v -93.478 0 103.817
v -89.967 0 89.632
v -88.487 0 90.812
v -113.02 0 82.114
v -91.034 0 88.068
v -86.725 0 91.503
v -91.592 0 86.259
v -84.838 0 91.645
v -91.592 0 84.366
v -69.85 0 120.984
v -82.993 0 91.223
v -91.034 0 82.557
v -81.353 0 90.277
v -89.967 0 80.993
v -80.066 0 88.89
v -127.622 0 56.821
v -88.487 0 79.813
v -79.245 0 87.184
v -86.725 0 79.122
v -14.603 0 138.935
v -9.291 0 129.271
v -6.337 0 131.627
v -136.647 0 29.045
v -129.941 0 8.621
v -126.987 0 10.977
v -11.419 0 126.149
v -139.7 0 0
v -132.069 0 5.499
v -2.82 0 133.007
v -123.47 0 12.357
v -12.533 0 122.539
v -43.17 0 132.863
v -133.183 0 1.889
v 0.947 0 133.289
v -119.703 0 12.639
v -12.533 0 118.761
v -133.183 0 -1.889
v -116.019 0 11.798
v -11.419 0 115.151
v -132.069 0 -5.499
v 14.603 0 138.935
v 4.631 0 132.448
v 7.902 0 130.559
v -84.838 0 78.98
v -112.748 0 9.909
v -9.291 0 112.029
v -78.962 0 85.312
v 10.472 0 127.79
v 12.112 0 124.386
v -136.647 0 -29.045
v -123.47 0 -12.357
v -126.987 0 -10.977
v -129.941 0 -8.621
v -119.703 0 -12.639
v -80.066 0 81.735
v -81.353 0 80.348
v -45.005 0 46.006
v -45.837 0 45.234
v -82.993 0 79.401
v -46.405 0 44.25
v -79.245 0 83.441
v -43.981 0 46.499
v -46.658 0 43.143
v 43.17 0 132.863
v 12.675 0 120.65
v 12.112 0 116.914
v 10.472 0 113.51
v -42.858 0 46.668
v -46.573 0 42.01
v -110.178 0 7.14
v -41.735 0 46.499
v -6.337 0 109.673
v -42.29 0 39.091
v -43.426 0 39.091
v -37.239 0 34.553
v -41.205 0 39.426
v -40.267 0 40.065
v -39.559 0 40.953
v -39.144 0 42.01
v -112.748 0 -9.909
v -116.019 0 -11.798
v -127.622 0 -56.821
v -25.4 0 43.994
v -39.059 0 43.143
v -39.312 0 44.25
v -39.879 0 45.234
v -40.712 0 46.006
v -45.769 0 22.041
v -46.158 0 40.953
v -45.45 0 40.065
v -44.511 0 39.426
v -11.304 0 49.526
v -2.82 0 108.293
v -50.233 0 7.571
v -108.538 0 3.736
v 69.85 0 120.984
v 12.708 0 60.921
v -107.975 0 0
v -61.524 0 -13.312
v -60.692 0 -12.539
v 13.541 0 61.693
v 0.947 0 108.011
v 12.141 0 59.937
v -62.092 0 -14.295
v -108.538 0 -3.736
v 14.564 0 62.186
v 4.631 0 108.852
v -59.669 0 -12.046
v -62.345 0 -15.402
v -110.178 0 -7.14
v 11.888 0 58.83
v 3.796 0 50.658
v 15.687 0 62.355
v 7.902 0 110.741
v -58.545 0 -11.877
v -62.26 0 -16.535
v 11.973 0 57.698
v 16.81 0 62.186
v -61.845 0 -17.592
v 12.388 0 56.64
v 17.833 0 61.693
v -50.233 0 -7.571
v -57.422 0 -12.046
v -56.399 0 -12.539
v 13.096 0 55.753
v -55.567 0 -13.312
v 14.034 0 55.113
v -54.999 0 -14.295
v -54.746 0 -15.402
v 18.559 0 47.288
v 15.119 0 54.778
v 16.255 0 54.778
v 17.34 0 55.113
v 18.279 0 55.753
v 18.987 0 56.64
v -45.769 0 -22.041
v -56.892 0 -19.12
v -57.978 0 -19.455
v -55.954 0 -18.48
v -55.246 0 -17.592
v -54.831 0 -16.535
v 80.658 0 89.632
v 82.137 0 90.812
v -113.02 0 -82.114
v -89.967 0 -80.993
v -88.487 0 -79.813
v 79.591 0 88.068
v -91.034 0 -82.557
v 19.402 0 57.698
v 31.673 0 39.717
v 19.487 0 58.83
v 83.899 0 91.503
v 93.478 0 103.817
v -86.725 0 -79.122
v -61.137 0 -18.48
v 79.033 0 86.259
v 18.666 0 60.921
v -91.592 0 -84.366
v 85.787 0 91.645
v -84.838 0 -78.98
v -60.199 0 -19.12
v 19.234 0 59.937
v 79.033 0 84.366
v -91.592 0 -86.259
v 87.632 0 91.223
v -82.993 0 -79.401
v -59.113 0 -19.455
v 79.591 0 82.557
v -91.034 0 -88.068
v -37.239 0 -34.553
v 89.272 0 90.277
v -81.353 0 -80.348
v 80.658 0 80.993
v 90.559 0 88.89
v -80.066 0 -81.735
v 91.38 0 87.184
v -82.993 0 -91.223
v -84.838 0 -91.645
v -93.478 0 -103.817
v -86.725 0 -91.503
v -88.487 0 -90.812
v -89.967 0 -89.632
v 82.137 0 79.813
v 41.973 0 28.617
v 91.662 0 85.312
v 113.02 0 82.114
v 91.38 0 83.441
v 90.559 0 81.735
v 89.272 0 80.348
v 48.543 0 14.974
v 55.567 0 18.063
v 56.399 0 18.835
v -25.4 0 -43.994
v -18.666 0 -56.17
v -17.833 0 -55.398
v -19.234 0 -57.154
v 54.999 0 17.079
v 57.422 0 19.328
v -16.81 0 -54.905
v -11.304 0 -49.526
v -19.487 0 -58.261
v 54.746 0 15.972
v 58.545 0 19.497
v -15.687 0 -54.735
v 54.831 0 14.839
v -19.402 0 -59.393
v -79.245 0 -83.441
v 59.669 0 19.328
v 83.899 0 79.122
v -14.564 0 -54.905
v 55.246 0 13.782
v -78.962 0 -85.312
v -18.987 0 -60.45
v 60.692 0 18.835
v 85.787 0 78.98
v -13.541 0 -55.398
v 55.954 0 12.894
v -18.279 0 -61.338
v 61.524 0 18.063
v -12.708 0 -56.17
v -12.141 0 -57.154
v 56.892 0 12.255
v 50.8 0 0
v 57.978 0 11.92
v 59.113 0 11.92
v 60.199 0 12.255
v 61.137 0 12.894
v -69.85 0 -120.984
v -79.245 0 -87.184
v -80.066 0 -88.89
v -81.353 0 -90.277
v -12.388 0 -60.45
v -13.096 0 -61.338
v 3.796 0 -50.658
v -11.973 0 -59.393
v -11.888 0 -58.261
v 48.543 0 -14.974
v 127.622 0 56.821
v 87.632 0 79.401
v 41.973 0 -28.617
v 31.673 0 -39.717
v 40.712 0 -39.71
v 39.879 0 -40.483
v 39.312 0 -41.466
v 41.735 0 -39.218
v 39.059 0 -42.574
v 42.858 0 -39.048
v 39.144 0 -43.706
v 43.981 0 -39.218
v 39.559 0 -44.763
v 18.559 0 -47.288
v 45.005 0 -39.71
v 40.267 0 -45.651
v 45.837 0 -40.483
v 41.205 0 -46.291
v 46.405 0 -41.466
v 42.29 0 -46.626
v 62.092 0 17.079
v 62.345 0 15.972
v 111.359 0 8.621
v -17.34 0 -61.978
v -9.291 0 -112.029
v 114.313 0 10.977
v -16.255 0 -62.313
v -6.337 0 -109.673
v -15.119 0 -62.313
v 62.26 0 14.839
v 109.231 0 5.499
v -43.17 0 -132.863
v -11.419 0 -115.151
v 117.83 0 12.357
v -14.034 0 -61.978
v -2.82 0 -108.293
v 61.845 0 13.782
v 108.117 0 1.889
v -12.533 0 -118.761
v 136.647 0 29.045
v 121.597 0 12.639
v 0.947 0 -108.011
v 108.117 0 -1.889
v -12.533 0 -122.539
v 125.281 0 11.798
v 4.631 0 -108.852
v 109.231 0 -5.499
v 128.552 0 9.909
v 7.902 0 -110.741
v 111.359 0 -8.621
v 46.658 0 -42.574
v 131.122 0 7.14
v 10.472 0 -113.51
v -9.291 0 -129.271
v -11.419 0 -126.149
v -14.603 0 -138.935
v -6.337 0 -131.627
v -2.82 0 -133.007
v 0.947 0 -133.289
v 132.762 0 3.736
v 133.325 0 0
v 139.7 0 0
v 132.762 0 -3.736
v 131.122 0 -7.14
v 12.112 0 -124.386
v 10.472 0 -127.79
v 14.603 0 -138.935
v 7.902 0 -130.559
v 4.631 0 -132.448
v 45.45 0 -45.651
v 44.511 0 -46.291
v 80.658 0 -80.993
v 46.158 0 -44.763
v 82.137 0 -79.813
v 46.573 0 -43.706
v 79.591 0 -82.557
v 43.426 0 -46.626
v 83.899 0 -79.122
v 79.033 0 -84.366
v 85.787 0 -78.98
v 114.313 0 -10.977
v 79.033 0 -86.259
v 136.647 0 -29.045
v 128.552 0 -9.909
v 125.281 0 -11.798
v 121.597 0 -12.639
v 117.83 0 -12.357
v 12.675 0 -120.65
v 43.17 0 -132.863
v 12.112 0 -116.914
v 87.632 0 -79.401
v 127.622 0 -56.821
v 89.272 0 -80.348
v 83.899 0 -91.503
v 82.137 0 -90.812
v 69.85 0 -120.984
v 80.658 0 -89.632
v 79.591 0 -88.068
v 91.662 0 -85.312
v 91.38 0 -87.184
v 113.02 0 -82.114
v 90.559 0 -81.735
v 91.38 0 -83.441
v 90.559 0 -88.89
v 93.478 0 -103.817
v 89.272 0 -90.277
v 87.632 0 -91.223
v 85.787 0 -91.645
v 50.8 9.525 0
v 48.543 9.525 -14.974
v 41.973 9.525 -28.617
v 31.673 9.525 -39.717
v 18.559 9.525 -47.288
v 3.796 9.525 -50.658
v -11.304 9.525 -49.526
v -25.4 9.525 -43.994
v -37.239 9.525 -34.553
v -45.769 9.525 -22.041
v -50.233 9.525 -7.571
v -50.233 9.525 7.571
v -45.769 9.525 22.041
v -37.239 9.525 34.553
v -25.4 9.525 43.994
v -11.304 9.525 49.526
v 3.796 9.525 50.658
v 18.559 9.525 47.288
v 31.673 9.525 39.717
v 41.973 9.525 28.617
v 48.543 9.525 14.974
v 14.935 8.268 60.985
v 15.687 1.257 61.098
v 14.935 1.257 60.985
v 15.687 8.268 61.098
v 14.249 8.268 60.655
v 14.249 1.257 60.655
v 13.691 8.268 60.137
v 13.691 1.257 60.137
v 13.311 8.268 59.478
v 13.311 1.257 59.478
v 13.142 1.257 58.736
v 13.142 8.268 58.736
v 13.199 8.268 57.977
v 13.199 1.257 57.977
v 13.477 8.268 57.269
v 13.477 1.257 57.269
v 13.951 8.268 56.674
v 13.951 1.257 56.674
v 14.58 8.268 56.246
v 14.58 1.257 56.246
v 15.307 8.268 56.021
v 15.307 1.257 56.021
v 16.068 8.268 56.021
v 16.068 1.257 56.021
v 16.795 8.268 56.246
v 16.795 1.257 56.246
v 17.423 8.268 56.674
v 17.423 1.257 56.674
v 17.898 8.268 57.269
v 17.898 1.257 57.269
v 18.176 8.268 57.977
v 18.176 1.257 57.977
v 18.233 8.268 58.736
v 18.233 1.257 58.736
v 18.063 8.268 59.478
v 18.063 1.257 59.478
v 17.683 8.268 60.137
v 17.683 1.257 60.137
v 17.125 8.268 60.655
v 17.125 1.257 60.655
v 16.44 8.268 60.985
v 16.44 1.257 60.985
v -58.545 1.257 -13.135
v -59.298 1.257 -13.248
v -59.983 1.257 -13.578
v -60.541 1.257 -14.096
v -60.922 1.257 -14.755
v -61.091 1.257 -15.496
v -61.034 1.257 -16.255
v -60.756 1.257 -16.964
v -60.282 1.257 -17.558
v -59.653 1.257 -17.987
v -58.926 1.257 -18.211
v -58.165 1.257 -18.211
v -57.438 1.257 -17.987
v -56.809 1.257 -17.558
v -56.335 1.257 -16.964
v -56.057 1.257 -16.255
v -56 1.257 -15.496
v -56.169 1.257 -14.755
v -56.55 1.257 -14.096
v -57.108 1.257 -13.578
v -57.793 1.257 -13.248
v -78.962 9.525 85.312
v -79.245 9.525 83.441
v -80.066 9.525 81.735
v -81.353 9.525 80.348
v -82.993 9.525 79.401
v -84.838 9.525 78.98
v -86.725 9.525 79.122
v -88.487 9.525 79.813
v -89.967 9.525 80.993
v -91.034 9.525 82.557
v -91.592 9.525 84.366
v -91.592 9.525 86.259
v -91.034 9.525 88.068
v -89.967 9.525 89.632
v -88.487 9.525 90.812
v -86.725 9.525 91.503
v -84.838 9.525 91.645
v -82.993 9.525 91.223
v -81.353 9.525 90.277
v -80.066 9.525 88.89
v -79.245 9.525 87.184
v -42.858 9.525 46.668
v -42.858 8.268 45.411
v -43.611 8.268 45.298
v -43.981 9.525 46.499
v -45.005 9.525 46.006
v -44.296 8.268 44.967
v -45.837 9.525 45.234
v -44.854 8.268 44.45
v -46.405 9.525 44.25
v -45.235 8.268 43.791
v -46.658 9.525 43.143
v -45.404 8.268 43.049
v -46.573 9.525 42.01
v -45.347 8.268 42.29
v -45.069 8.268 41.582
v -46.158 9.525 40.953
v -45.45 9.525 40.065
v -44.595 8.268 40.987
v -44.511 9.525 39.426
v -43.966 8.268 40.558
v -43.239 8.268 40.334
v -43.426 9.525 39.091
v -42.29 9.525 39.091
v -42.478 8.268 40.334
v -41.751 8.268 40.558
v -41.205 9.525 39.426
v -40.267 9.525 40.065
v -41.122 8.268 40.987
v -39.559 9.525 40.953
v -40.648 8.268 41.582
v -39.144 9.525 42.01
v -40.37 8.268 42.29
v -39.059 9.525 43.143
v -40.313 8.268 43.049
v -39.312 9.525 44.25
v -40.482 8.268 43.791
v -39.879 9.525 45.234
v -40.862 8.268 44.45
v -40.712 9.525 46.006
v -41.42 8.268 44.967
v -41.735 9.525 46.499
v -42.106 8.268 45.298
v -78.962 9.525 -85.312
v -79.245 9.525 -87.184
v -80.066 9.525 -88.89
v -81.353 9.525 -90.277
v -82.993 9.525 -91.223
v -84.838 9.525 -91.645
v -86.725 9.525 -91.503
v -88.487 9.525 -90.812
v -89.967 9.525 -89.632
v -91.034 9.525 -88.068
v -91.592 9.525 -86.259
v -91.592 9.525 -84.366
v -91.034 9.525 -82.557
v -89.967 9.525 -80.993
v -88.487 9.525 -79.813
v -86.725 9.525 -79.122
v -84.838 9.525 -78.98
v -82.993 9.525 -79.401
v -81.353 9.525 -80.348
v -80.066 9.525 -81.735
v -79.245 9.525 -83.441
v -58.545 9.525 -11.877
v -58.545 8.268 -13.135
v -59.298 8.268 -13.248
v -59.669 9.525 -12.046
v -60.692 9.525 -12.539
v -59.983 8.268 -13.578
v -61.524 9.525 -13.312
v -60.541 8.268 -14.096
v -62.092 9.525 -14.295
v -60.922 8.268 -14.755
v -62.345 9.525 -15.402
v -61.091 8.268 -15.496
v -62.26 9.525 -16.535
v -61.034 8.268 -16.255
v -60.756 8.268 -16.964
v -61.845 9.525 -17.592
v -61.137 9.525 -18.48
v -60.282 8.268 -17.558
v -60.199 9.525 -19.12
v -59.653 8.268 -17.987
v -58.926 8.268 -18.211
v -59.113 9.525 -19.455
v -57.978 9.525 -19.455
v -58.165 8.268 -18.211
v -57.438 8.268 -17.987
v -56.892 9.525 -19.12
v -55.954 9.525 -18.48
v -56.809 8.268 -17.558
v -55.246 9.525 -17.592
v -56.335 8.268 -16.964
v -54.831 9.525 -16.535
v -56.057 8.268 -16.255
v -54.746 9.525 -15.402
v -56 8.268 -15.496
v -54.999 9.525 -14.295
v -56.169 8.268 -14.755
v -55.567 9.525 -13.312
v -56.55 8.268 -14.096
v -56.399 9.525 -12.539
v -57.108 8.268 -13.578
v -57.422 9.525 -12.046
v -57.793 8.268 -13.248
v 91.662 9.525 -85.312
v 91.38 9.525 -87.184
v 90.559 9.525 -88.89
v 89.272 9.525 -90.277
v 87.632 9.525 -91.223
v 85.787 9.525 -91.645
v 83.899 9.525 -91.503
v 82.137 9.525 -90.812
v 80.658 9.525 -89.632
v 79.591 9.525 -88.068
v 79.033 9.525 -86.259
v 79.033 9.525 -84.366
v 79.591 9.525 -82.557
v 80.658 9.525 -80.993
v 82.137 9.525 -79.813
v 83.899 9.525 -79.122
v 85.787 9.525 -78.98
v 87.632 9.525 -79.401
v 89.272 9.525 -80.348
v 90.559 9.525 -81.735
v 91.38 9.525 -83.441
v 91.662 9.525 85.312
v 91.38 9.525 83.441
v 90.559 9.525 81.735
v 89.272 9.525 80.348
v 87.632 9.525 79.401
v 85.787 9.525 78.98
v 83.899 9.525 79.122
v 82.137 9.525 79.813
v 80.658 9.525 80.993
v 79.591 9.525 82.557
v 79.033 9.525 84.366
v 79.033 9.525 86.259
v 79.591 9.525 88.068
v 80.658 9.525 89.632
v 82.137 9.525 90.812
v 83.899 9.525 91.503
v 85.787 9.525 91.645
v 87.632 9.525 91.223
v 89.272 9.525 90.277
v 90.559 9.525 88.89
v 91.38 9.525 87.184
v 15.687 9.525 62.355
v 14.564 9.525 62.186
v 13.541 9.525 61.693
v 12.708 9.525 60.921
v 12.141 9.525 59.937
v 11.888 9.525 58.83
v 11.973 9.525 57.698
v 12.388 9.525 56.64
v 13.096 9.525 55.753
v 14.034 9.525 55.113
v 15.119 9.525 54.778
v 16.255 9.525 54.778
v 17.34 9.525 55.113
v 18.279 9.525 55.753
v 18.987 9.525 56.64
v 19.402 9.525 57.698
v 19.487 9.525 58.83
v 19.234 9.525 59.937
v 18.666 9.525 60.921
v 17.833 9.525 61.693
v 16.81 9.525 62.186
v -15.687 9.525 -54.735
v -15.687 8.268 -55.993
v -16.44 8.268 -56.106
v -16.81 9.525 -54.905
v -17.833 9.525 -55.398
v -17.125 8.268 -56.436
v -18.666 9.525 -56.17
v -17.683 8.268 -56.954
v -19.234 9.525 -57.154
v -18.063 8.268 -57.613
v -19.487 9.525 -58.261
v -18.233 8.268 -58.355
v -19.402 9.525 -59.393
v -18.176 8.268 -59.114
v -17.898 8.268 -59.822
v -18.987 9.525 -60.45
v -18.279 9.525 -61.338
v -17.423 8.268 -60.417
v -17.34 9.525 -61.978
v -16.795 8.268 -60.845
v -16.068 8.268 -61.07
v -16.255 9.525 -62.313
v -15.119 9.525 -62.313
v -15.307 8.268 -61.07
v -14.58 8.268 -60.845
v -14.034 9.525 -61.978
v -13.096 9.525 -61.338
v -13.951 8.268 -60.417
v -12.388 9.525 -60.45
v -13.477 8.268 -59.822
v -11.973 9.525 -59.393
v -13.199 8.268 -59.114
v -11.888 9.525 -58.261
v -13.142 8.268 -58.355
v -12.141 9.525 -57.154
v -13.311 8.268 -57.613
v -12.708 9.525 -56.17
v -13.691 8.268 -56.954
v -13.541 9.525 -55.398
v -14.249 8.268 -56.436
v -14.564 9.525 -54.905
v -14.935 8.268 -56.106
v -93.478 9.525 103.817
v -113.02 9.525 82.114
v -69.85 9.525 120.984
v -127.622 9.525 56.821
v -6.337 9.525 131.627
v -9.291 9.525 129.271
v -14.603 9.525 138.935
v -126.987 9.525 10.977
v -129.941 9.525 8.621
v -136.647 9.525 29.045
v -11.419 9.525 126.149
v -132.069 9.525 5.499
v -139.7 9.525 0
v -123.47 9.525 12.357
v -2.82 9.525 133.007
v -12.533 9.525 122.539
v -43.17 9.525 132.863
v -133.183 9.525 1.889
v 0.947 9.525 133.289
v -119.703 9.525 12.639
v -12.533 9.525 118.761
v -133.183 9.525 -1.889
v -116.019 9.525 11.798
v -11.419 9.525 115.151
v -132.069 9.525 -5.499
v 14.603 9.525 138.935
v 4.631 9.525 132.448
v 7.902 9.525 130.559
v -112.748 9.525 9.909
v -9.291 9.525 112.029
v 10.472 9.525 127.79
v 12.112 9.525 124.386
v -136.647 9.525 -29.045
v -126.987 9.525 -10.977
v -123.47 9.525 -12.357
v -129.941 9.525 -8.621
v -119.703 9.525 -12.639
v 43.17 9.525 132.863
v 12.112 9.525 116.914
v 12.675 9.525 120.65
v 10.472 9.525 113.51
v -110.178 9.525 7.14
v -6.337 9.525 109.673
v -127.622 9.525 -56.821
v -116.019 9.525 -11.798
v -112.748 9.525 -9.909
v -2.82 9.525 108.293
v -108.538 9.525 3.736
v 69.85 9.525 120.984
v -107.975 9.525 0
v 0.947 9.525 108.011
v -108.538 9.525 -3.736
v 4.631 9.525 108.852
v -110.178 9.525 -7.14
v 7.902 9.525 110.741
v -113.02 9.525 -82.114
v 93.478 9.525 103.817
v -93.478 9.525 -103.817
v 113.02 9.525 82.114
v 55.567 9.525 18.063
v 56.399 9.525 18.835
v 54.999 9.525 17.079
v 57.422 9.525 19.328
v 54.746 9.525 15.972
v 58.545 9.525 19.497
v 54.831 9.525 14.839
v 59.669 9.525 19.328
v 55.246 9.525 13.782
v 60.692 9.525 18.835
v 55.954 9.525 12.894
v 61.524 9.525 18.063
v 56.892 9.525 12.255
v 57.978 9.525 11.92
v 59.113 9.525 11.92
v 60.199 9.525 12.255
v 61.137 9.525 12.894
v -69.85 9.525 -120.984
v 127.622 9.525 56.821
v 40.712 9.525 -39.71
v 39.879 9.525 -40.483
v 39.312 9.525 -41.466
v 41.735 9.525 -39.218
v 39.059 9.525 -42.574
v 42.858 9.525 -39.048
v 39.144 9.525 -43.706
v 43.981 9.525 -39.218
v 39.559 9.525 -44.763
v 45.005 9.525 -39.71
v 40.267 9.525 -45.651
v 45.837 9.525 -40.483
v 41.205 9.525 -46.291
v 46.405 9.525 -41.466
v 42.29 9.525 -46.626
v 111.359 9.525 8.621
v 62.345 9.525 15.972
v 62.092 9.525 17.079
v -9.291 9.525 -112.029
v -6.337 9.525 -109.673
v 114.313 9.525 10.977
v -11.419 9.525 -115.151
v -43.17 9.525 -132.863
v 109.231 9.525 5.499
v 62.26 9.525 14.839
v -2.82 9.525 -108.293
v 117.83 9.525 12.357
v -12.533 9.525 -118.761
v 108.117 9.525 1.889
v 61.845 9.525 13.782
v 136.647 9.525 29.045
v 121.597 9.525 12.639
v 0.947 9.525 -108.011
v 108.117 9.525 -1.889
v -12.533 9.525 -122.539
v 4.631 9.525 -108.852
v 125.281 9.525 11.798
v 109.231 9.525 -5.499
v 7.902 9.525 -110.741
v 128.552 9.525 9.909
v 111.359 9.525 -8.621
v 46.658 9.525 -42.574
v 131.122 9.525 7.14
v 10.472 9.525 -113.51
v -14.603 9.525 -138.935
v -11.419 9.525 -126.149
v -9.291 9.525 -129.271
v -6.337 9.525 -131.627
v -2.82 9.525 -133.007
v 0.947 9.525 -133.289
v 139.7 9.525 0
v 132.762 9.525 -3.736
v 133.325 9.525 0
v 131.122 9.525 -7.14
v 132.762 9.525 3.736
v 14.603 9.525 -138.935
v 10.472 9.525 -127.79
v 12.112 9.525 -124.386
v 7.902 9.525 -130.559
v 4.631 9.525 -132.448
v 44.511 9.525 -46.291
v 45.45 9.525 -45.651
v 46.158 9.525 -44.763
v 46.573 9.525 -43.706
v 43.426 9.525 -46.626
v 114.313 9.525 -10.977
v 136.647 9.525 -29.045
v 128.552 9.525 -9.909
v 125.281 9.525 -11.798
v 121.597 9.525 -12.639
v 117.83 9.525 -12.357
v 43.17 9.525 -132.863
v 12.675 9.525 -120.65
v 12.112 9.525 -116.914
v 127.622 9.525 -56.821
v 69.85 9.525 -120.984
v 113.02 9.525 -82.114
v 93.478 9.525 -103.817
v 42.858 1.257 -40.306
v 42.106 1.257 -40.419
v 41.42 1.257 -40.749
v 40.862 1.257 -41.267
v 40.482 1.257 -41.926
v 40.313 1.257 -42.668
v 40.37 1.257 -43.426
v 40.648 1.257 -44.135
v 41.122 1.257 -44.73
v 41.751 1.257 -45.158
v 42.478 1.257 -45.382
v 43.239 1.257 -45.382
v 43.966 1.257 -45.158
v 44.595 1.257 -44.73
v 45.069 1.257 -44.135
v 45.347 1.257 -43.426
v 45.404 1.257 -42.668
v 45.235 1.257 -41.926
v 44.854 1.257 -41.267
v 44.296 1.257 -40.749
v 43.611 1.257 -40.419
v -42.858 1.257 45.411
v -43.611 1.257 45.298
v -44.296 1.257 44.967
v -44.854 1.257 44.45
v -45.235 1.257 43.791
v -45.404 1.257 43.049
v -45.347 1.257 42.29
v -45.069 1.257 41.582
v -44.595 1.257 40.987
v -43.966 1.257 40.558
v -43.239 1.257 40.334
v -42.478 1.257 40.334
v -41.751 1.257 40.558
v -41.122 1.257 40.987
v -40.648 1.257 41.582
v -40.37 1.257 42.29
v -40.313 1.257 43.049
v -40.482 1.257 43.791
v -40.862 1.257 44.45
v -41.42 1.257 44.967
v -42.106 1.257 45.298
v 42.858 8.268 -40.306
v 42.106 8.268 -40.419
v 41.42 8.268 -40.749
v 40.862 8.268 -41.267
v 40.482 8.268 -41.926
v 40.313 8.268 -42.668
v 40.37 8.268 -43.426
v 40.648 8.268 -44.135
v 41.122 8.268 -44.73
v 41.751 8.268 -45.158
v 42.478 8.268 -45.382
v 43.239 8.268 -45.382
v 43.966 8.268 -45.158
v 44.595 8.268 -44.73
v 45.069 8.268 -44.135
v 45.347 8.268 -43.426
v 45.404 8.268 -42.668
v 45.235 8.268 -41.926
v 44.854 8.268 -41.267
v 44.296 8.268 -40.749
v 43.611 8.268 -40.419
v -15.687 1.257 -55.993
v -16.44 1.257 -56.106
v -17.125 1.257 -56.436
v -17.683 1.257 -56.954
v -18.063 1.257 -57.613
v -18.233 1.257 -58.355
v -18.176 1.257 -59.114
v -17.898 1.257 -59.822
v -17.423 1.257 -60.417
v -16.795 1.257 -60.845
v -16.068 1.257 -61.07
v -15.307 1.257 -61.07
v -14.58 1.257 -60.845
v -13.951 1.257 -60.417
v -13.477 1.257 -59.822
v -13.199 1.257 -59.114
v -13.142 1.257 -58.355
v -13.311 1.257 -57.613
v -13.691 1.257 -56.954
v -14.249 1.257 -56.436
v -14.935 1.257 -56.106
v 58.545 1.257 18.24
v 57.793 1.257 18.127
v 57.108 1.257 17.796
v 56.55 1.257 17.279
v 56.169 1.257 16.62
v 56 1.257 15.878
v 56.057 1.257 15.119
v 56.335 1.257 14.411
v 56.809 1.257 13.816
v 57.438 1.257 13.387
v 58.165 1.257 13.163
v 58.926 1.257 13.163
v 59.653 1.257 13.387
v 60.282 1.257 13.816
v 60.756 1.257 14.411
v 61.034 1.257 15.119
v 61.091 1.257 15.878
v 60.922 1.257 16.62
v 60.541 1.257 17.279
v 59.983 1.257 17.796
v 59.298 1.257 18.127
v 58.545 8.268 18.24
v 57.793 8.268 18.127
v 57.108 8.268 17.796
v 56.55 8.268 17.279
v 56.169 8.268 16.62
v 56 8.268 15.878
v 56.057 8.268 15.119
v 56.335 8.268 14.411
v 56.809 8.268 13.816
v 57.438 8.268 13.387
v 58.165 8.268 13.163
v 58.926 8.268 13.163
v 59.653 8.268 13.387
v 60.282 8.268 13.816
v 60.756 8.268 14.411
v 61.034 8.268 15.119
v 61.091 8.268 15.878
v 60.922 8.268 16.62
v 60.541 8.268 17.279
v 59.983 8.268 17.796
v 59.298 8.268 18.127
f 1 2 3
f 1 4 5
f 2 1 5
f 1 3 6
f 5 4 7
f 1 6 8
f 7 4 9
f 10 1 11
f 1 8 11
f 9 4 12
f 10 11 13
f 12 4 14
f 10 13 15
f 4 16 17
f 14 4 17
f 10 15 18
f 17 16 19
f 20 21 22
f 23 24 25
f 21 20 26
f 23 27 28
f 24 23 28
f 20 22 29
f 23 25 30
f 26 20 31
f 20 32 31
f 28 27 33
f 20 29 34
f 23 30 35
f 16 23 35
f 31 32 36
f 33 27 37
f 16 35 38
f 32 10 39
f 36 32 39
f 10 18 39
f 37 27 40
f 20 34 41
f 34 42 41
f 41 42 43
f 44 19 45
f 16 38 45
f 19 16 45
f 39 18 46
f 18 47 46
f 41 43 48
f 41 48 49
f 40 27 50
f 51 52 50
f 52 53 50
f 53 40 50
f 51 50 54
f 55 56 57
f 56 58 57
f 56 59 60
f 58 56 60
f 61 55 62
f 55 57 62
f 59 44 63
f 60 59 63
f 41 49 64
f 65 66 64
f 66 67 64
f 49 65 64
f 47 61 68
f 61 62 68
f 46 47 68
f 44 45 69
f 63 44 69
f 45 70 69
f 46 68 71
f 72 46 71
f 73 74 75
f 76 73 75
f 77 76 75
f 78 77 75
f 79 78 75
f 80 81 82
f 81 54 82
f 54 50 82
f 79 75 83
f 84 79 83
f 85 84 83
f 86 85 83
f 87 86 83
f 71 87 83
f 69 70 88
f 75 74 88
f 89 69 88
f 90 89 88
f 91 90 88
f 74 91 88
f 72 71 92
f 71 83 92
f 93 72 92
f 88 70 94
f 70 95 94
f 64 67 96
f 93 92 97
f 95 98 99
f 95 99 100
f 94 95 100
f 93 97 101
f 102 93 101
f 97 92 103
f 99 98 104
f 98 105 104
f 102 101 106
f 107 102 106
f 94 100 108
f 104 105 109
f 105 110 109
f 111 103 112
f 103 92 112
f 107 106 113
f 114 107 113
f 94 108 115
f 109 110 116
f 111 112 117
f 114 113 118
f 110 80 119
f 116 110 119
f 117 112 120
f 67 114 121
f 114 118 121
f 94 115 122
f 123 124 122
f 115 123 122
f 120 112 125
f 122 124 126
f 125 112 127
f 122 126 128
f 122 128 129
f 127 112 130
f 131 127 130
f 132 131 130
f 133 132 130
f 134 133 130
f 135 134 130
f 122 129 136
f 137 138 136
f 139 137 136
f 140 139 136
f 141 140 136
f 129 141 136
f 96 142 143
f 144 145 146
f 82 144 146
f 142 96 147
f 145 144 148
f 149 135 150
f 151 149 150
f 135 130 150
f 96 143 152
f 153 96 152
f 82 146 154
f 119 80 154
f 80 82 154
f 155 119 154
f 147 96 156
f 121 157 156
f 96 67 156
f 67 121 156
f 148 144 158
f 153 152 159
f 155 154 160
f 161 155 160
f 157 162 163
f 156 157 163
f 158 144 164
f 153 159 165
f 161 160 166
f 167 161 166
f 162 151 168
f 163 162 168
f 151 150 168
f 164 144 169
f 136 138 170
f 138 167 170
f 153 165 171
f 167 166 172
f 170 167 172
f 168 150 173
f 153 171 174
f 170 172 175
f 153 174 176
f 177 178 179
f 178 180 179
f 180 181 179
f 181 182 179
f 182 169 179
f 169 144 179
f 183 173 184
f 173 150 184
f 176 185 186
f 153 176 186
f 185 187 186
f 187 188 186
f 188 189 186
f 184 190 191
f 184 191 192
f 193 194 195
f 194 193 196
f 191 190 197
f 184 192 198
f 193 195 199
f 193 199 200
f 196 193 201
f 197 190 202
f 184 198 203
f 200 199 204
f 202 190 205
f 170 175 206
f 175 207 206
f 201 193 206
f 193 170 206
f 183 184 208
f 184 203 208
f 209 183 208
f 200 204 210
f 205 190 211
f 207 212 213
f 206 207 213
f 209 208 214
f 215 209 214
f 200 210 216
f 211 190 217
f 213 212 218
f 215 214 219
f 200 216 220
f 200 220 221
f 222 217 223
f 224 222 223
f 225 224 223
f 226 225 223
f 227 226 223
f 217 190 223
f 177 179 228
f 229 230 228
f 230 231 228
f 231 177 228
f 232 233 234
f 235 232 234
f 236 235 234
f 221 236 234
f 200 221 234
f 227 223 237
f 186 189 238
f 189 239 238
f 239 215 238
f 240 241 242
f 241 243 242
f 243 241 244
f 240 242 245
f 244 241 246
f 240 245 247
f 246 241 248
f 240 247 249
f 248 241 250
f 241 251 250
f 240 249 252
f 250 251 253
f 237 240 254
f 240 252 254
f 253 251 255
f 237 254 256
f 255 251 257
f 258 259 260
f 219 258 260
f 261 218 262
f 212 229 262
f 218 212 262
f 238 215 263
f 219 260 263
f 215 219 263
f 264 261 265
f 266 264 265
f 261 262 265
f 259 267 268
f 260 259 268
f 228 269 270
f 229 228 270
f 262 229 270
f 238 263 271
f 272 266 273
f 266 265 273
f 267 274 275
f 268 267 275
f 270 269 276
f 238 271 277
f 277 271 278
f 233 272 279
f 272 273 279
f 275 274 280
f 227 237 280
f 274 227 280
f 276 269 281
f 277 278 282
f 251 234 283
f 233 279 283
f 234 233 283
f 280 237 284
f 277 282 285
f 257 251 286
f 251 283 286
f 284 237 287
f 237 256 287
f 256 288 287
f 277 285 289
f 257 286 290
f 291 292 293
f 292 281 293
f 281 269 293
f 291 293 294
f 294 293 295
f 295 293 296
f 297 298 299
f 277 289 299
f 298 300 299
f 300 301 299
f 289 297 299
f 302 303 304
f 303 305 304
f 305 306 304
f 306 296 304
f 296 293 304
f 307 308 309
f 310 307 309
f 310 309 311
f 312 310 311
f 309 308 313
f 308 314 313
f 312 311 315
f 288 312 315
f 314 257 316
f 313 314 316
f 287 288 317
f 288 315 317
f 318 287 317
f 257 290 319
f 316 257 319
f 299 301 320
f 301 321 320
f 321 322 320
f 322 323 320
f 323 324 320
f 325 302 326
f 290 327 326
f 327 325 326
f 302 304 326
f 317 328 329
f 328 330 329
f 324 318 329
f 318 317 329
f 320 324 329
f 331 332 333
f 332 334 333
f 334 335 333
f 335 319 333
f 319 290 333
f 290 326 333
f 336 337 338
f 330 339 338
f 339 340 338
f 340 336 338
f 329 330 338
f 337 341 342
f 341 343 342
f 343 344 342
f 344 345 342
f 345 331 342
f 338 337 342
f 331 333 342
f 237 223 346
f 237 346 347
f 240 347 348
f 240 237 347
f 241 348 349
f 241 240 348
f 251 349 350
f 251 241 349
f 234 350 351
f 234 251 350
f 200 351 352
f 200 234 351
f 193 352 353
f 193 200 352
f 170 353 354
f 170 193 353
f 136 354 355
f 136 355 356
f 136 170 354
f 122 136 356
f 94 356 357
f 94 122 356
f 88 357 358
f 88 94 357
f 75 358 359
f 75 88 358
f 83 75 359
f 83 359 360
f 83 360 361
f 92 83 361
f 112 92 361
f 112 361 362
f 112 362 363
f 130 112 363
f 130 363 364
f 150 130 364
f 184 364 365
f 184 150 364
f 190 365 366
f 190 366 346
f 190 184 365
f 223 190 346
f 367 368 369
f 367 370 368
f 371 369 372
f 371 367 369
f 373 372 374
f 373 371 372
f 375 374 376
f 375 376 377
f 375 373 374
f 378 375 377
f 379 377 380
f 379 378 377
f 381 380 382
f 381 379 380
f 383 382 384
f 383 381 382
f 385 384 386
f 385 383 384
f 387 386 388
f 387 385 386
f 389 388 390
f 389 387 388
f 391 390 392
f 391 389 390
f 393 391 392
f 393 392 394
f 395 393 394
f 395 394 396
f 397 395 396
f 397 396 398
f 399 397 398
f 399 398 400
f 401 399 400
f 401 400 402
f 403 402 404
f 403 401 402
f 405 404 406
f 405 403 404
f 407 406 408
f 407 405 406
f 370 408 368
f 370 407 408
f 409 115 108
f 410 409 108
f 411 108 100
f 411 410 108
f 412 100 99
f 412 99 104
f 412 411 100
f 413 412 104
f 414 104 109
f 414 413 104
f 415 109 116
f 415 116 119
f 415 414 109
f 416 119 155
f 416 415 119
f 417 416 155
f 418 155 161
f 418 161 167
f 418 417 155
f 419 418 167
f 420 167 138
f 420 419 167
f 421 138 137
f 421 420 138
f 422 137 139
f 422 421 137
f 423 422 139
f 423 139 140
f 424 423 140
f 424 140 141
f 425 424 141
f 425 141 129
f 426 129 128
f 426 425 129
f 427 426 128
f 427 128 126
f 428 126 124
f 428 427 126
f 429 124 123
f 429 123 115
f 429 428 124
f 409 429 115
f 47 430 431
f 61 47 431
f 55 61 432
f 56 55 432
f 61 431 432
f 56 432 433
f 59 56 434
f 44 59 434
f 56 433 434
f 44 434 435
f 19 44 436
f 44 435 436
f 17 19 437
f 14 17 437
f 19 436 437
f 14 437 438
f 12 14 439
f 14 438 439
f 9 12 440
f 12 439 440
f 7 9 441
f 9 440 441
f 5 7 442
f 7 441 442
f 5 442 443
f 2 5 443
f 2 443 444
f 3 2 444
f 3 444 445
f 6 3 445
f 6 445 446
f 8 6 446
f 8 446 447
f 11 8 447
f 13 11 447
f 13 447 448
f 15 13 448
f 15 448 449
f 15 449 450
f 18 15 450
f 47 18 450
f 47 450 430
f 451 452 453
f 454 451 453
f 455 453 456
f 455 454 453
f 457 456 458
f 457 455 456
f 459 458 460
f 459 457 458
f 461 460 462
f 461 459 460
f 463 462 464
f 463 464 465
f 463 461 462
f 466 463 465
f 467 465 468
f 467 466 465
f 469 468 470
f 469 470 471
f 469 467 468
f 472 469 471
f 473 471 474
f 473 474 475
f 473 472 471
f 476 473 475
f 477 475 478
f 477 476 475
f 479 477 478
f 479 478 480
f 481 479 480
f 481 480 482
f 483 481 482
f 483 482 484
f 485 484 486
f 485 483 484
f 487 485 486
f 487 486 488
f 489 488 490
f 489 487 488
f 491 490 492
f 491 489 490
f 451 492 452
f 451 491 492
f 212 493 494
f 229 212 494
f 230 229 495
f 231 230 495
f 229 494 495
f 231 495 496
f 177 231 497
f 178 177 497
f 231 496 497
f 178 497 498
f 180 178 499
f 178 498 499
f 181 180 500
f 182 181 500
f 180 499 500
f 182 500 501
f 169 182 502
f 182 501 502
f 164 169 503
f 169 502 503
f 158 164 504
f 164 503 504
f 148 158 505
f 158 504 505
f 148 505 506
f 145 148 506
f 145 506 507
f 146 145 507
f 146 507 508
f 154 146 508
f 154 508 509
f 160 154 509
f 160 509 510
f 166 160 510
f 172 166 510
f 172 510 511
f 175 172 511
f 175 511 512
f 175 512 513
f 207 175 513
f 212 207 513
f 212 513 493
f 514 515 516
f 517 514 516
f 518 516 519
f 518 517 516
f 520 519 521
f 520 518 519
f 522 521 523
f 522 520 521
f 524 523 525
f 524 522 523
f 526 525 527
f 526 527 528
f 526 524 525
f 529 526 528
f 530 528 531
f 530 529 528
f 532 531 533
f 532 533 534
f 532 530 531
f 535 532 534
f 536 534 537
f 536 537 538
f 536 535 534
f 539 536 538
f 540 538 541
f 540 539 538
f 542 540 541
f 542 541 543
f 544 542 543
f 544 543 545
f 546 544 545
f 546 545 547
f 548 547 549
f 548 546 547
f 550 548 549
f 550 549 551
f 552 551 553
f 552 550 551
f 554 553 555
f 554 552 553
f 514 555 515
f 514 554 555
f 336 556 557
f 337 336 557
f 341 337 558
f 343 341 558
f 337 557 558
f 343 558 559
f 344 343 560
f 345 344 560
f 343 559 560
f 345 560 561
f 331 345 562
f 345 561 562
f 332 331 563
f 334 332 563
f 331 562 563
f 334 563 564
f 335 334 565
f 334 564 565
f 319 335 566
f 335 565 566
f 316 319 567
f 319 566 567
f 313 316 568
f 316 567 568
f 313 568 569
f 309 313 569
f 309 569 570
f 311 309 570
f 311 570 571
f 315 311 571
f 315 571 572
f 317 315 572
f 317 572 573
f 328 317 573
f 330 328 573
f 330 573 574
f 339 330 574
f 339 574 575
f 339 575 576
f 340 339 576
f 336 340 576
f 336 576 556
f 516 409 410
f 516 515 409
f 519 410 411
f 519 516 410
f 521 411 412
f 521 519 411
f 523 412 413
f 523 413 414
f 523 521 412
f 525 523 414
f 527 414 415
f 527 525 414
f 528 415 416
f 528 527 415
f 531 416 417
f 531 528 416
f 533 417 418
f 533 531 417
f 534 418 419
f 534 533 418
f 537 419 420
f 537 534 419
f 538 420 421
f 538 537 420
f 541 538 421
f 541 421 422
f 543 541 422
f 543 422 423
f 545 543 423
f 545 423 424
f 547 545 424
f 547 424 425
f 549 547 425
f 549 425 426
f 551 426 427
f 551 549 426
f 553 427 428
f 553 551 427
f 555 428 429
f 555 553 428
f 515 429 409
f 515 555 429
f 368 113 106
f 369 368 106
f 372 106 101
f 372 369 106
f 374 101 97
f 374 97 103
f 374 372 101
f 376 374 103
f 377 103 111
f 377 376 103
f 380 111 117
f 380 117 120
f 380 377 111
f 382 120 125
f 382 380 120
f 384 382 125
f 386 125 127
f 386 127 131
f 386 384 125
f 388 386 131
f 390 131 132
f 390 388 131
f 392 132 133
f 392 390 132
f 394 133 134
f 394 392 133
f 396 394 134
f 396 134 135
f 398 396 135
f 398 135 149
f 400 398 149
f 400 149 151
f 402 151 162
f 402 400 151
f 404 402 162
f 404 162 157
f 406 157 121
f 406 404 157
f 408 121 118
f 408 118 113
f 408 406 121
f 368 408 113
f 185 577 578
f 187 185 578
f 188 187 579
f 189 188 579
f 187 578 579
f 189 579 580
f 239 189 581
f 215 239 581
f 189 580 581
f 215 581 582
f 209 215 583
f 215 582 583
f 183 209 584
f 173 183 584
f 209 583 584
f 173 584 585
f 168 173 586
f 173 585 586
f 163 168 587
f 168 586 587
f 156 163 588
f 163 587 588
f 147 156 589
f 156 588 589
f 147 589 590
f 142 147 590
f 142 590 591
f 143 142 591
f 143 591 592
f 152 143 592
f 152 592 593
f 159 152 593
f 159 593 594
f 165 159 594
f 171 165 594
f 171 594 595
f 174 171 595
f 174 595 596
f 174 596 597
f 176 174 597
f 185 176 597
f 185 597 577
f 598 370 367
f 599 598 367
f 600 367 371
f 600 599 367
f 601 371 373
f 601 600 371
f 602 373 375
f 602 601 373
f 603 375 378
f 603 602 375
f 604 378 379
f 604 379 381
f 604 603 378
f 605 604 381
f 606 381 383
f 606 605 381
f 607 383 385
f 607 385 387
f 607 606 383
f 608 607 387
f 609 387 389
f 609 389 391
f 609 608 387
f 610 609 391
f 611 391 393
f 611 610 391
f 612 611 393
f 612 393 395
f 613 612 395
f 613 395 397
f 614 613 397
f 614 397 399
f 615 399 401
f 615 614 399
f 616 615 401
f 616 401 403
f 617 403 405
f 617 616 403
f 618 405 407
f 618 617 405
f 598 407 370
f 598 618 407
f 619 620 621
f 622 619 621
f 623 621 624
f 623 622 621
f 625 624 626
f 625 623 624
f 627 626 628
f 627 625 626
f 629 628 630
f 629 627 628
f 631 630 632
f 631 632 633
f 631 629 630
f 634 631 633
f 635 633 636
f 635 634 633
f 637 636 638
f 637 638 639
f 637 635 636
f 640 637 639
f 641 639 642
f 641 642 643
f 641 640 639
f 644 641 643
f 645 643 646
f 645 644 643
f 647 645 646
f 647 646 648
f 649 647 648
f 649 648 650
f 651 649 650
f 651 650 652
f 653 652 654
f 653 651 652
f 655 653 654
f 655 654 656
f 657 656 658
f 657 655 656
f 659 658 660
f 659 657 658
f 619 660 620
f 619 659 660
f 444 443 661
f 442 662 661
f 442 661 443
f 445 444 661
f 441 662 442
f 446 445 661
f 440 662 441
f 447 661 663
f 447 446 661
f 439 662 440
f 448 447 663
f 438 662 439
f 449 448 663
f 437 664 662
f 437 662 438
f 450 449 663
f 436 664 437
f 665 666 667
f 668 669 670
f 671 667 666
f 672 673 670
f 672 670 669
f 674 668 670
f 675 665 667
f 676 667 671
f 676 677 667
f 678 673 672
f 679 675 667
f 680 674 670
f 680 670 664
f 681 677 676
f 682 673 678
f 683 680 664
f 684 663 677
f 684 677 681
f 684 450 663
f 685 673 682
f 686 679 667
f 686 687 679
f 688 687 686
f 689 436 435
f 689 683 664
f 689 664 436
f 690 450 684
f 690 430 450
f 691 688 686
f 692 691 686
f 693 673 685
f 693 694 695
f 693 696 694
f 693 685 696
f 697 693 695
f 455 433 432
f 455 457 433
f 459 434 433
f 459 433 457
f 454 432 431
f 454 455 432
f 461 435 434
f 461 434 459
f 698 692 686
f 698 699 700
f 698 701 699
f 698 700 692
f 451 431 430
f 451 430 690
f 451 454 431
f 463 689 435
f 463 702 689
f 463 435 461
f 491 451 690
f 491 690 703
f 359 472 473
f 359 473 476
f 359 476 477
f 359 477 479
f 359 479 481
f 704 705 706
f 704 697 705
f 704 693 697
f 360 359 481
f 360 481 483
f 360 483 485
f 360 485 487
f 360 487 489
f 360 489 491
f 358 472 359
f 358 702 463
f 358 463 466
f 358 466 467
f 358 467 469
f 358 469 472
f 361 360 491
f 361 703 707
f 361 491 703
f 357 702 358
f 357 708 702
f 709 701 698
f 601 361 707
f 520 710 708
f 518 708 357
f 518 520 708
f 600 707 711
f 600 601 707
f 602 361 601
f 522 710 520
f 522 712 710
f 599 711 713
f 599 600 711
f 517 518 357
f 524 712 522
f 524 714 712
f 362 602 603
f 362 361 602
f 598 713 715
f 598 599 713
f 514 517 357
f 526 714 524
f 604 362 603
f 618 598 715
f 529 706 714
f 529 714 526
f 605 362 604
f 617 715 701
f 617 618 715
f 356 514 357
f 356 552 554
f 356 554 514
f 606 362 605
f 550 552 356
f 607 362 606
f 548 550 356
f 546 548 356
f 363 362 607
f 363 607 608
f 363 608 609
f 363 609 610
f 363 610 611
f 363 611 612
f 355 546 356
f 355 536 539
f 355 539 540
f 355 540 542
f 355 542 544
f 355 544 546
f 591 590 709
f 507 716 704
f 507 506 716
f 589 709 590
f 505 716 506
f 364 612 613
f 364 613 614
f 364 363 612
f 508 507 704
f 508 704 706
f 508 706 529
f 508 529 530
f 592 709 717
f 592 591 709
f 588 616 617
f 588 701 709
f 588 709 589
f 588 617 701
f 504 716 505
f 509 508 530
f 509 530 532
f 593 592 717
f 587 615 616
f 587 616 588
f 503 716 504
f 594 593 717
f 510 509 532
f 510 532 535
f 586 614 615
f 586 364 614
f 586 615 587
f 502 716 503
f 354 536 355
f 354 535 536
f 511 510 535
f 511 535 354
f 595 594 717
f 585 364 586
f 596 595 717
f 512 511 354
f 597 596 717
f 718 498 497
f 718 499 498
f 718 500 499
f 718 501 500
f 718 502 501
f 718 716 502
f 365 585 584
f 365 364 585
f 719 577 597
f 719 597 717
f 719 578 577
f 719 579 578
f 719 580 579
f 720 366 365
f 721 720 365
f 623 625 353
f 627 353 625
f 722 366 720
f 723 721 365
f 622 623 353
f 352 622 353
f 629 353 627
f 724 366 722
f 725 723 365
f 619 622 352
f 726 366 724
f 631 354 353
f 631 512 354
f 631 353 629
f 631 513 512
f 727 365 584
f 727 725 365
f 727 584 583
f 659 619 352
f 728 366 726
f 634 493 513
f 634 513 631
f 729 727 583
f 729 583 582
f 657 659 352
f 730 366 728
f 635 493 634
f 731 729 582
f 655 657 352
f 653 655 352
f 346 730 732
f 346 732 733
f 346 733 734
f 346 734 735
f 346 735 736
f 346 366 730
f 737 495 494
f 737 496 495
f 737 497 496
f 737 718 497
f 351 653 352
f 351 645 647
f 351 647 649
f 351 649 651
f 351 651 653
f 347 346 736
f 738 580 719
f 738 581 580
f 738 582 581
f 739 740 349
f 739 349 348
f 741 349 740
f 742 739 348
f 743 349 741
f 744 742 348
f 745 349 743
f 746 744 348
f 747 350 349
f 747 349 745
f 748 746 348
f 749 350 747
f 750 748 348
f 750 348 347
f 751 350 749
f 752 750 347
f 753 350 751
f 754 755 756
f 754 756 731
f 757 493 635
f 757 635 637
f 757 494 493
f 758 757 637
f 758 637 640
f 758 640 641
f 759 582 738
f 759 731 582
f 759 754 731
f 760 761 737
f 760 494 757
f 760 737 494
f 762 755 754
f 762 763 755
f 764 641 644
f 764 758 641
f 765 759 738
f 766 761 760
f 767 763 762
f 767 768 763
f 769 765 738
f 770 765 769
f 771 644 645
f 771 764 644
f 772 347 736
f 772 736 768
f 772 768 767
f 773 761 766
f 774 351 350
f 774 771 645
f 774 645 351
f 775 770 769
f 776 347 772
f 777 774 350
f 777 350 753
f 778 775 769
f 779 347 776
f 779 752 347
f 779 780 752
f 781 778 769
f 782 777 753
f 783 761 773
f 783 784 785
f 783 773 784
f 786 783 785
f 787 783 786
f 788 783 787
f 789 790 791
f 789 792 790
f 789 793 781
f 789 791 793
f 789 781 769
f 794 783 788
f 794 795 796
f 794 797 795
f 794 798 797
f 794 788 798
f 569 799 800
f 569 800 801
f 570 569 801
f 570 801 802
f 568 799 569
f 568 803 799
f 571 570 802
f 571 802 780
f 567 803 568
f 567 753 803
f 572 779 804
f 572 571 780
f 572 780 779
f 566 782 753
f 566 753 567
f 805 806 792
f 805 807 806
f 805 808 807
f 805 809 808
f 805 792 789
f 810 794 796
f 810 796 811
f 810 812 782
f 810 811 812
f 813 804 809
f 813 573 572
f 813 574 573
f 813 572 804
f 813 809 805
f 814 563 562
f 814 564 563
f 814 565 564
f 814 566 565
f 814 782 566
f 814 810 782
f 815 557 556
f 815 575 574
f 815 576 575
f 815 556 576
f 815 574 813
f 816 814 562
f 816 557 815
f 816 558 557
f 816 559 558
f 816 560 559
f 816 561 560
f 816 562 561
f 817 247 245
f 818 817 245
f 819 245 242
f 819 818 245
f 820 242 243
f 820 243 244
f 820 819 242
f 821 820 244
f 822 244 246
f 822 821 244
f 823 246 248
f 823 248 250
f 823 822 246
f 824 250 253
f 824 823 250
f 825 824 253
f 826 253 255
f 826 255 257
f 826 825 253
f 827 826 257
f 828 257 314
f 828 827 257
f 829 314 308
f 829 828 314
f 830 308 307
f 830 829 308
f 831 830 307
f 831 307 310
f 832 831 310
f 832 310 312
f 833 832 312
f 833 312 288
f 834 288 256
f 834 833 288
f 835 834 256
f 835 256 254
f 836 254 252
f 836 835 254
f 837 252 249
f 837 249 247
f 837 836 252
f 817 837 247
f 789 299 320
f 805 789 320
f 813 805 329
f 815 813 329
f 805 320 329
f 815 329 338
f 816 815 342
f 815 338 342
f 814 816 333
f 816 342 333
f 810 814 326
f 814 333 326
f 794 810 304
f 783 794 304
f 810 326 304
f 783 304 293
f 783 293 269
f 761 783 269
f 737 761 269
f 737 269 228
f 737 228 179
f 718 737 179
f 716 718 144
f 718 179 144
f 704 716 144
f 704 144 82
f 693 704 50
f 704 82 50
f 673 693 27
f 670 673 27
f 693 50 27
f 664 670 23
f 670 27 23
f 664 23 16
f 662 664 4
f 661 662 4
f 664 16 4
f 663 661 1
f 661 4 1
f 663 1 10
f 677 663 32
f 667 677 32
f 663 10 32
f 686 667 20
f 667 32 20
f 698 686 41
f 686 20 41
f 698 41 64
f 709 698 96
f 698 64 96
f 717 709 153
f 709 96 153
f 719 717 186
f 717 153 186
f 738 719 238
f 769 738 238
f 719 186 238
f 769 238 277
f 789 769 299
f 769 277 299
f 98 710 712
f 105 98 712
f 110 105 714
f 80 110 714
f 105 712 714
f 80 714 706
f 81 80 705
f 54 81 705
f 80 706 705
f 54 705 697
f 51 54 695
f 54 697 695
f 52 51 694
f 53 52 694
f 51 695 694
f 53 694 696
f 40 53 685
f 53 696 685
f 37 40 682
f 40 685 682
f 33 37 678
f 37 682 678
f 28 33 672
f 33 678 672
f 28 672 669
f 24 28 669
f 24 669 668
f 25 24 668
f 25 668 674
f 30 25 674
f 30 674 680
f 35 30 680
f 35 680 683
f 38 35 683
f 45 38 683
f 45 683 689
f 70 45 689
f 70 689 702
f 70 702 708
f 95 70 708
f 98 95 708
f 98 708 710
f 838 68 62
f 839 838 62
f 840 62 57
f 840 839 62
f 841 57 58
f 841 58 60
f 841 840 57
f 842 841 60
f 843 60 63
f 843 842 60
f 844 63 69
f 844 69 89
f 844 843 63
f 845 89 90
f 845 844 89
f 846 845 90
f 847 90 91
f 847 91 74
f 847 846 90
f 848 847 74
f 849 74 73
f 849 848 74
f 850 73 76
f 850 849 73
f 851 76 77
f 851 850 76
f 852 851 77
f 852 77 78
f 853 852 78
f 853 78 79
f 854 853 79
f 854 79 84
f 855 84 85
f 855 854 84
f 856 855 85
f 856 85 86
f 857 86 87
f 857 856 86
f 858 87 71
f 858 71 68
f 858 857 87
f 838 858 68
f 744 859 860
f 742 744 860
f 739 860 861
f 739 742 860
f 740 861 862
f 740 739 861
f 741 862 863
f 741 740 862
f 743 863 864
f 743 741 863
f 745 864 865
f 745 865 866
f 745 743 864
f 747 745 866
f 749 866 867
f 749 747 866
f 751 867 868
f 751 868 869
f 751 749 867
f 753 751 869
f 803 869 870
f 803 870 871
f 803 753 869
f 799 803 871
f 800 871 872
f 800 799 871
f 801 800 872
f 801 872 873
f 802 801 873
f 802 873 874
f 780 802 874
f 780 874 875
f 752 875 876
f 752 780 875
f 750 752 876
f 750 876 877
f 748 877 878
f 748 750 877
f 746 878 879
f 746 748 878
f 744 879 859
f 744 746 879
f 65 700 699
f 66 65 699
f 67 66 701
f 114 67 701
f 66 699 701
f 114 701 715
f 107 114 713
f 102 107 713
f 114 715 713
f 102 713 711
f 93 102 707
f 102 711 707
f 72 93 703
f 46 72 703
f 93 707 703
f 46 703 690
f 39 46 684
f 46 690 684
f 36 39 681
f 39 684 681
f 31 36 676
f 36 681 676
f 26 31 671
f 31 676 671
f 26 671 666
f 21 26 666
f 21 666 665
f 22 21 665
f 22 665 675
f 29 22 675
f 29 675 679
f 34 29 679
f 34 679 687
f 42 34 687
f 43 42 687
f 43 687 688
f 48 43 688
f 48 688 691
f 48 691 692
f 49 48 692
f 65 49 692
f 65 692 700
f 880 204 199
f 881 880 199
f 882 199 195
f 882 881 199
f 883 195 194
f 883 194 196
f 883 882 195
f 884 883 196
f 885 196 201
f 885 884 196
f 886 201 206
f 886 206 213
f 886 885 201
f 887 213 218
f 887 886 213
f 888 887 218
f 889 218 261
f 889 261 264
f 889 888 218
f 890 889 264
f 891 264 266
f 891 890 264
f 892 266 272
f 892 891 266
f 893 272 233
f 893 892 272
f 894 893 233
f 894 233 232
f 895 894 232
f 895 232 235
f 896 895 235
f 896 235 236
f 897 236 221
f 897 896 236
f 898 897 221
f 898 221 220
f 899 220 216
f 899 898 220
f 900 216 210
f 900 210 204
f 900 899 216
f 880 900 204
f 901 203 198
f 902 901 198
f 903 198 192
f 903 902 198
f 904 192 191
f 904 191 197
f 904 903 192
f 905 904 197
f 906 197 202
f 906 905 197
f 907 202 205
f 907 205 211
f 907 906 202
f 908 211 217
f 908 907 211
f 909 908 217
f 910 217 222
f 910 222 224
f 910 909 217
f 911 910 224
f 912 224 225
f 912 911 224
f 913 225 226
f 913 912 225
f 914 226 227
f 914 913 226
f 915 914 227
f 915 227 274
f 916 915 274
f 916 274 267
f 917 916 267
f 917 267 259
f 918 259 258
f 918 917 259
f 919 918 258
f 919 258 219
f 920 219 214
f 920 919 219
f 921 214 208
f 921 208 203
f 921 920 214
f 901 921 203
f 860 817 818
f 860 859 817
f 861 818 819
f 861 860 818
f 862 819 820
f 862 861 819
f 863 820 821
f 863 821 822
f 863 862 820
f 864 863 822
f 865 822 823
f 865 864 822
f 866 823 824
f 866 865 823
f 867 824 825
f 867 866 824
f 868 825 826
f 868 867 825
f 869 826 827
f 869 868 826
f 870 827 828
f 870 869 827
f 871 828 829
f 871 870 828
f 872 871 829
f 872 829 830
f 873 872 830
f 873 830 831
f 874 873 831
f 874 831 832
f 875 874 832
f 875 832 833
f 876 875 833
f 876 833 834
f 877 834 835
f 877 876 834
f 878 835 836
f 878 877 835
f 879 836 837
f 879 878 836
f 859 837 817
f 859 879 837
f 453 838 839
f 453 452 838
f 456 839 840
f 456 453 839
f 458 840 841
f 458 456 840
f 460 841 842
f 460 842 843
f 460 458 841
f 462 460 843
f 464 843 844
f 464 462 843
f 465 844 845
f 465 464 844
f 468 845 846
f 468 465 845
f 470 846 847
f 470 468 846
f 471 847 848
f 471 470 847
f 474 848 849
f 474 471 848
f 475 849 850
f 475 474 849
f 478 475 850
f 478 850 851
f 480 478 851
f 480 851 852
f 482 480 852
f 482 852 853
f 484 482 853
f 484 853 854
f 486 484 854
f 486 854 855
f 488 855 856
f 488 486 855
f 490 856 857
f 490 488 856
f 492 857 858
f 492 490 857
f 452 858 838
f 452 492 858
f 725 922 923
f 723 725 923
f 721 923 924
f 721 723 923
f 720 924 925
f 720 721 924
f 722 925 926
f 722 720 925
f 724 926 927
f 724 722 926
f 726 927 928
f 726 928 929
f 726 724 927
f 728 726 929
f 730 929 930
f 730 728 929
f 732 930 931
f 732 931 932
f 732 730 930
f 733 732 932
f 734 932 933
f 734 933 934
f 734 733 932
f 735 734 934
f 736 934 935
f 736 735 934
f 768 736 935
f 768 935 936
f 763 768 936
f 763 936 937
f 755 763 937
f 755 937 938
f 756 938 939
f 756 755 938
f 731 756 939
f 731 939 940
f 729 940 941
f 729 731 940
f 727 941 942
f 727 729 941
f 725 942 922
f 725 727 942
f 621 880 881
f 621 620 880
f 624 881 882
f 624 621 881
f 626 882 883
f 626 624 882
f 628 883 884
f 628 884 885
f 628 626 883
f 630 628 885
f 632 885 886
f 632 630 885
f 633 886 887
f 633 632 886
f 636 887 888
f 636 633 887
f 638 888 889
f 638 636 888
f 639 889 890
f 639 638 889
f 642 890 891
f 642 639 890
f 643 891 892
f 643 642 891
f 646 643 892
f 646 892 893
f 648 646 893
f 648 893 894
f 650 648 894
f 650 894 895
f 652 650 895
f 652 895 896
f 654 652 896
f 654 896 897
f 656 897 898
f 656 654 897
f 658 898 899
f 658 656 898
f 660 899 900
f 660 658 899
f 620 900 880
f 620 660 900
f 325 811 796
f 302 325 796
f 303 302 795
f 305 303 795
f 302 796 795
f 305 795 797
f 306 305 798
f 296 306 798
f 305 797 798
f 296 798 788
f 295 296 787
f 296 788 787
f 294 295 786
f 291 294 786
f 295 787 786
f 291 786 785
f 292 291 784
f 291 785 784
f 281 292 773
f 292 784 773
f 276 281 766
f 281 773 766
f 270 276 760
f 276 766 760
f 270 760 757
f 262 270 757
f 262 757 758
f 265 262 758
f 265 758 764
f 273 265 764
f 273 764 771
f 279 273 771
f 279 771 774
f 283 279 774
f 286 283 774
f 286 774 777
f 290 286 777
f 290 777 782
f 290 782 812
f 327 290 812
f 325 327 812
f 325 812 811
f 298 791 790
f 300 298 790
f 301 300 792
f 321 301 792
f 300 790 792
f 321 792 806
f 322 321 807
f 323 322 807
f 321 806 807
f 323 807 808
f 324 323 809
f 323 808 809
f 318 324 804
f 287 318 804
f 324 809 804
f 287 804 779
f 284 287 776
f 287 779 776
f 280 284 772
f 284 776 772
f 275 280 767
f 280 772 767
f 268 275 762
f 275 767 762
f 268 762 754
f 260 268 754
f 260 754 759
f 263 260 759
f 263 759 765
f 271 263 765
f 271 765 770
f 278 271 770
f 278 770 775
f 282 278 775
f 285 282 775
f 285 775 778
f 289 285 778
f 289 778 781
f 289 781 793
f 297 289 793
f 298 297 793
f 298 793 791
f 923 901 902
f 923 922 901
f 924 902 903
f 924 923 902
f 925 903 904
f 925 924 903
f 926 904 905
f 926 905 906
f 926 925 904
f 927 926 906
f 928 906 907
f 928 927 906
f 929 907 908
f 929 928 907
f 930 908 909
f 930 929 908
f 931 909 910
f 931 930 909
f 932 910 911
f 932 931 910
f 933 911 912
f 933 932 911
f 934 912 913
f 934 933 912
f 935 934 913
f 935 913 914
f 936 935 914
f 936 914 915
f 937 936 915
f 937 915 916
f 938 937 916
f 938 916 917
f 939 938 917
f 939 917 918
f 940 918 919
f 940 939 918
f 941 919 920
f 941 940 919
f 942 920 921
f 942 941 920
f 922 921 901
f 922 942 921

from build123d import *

# Parameters (mm, degrees)
SKETCH2_R                        = 139.7
SKETCH2_R_2                      = 50.8
BOSS_EXTRUDE1_DEPTH              = 9.525
SKETCH3_R                        = 12.6746
SKETCH3_R_2                      = 6.35
CUT_EXTRUDE2_DEPTH               = 10.525
F_1_4_20_TAPPED_HOLE1_AT_2_COUNT = 2
F_1_4_20_TAPPED_HOLE1_AT_2_PITCH = 60.61075
F_1_4_20_TAPPED_HOLE1_AT_3_COUNT = 2
F_1_4_20_TAPPED_HOLE1_AT_3_PITCH = 104.980898485
F_1_4_20_TAPPED_HOLE1_AT_4_COUNT = 2
F_1_4_20_TAPPED_HOLE1_AT_4_PITCH = 121.2215
F_1_4_20_TAPPED_HOLE1_AT_5_COUNT = 2
F_1_4_20_TAPPED_HOLE1_AT_5_PITCH = 104.980898485
F_1_4_20_TAPPED_HOLE1_AT_6_COUNT = 2
F_1_4_20_TAPPED_HOLE1_AT_6_PITCH = 60.61075


with BuildPart() as part:
    # Sketch2 → Boss-Extrude1 (new body)
    with BuildSketch(Plane(origin=(0, 0, 0), x_dir=(1, 0, 0), z_dir=(0, 1, 0))):
        Circle(SKETCH2_R)
        Circle(SKETCH2_R_2, mode=Mode.SUBTRACT)
    extrude(amount=BOSS_EXTRUDE1_DEPTH)

    # Sketch3 → Cut-Extrude2 (cut, through all)
    with BuildSketch(Plane(origin=(0, 9.525, 0), x_dir=(1, 0, 0), z_dir=(0, 1, 0))):
        with Locations((0, 120.65)):
            Circle(SKETCH3_R)
        with Locations((120.65, 0)):
            Circle(SKETCH3_R)
        with Locations((0, -120.65)):
            Circle(SKETCH3_R)
        with Locations((-120.65, 0)):
            Circle(SKETCH3_R)
        with Locations((85.31243315, 85.31243315)):
            Circle(SKETCH3_R_2)
        with Locations((85.31243315, -85.31243315)):
            Circle(SKETCH3_R_2)
        with Locations((-85.31243315, -85.31243315)):
            Circle(SKETCH3_R_2)
        with Locations((-85.31243315, 85.31243315)):
            Circle(SKETCH3_R_2)
    extrude(amount=-CUT_EXTRUDE2_DEPTH, mode=Mode.SUBTRACT)

    # Sketch6 → 1/4-20 Tapped Hole1 (revolve, cut)
    with BuildSketch(Plane(origin=(-58.545488776, 9.525, -15.687216438), x_dir=(0, 0, 1), z_dir=(1, 0, 0))):
        Polygon((0, 0), (0, 9.525), (3.81, 9.525), (2.5527, 8.2677), (2.5527, 1.2573), (3.81, 0), align=None)
    f_1_4_20_tapped_hole1 = revolve(axis=Axis((-58.545488776, 15.875, -15.687216438), (0, -1, 0)), mode=Mode.SUBTRACT)

    # 1/4-20 Tapped Hole1 at 2: 1/4-20 Tapped Hole1 ×2
    with Locations(*[Vector(0.707106781, 0, -0.707106781) * (i * F_1_4_20_TAPPED_HOLE1_AT_2_PITCH) for i in range(1, F_1_4_20_TAPPED_HOLE1_AT_2_COUNT)]):
        add(f_1_4_20_tapped_hole1, mode=Mode.SUBTRACT)

    # 1/4-20 Tapped Hole1 at 3: 1/4-20 Tapped Hole1 ×2
    with Locations(*[Vector(0.965925826, 0, -0.258819045) * (i * F_1_4_20_TAPPED_HOLE1_AT_3_PITCH) for i in range(1, F_1_4_20_TAPPED_HOLE1_AT_3_COUNT)]):
        add(f_1_4_20_tapped_hole1, mode=Mode.SUBTRACT)

    # 1/4-20 Tapped Hole1 at 4: 1/4-20 Tapped Hole1 ×2
    with Locations(*[Vector(0.965925826, 0, 0.258819045) * (i * F_1_4_20_TAPPED_HOLE1_AT_4_PITCH) for i in range(1, F_1_4_20_TAPPED_HOLE1_AT_4_COUNT)]):
        add(f_1_4_20_tapped_hole1, mode=Mode.SUBTRACT)

    # 1/4-20 Tapped Hole1 at 5: 1/4-20 Tapped Hole1 ×2
    with Locations(*[Vector(0.707106781, 0, 0.707106781) * (i * F_1_4_20_TAPPED_HOLE1_AT_5_PITCH) for i in range(1, F_1_4_20_TAPPED_HOLE1_AT_5_COUNT)]):
        add(f_1_4_20_tapped_hole1, mode=Mode.SUBTRACT)

    # 1/4-20 Tapped Hole1 at 6: 1/4-20 Tapped Hole1 ×2
    with Locations(*[Vector(0.258819045, 0, 0.965925826) * (i * F_1_4_20_TAPPED_HOLE1_AT_6_PITCH) for i in range(1, F_1_4_20_TAPPED_HOLE1_AT_6_COUNT)]):
        add(f_1_4_20_tapped_hole1, mode=Mode.SUBTRACT)


solid = part.part
